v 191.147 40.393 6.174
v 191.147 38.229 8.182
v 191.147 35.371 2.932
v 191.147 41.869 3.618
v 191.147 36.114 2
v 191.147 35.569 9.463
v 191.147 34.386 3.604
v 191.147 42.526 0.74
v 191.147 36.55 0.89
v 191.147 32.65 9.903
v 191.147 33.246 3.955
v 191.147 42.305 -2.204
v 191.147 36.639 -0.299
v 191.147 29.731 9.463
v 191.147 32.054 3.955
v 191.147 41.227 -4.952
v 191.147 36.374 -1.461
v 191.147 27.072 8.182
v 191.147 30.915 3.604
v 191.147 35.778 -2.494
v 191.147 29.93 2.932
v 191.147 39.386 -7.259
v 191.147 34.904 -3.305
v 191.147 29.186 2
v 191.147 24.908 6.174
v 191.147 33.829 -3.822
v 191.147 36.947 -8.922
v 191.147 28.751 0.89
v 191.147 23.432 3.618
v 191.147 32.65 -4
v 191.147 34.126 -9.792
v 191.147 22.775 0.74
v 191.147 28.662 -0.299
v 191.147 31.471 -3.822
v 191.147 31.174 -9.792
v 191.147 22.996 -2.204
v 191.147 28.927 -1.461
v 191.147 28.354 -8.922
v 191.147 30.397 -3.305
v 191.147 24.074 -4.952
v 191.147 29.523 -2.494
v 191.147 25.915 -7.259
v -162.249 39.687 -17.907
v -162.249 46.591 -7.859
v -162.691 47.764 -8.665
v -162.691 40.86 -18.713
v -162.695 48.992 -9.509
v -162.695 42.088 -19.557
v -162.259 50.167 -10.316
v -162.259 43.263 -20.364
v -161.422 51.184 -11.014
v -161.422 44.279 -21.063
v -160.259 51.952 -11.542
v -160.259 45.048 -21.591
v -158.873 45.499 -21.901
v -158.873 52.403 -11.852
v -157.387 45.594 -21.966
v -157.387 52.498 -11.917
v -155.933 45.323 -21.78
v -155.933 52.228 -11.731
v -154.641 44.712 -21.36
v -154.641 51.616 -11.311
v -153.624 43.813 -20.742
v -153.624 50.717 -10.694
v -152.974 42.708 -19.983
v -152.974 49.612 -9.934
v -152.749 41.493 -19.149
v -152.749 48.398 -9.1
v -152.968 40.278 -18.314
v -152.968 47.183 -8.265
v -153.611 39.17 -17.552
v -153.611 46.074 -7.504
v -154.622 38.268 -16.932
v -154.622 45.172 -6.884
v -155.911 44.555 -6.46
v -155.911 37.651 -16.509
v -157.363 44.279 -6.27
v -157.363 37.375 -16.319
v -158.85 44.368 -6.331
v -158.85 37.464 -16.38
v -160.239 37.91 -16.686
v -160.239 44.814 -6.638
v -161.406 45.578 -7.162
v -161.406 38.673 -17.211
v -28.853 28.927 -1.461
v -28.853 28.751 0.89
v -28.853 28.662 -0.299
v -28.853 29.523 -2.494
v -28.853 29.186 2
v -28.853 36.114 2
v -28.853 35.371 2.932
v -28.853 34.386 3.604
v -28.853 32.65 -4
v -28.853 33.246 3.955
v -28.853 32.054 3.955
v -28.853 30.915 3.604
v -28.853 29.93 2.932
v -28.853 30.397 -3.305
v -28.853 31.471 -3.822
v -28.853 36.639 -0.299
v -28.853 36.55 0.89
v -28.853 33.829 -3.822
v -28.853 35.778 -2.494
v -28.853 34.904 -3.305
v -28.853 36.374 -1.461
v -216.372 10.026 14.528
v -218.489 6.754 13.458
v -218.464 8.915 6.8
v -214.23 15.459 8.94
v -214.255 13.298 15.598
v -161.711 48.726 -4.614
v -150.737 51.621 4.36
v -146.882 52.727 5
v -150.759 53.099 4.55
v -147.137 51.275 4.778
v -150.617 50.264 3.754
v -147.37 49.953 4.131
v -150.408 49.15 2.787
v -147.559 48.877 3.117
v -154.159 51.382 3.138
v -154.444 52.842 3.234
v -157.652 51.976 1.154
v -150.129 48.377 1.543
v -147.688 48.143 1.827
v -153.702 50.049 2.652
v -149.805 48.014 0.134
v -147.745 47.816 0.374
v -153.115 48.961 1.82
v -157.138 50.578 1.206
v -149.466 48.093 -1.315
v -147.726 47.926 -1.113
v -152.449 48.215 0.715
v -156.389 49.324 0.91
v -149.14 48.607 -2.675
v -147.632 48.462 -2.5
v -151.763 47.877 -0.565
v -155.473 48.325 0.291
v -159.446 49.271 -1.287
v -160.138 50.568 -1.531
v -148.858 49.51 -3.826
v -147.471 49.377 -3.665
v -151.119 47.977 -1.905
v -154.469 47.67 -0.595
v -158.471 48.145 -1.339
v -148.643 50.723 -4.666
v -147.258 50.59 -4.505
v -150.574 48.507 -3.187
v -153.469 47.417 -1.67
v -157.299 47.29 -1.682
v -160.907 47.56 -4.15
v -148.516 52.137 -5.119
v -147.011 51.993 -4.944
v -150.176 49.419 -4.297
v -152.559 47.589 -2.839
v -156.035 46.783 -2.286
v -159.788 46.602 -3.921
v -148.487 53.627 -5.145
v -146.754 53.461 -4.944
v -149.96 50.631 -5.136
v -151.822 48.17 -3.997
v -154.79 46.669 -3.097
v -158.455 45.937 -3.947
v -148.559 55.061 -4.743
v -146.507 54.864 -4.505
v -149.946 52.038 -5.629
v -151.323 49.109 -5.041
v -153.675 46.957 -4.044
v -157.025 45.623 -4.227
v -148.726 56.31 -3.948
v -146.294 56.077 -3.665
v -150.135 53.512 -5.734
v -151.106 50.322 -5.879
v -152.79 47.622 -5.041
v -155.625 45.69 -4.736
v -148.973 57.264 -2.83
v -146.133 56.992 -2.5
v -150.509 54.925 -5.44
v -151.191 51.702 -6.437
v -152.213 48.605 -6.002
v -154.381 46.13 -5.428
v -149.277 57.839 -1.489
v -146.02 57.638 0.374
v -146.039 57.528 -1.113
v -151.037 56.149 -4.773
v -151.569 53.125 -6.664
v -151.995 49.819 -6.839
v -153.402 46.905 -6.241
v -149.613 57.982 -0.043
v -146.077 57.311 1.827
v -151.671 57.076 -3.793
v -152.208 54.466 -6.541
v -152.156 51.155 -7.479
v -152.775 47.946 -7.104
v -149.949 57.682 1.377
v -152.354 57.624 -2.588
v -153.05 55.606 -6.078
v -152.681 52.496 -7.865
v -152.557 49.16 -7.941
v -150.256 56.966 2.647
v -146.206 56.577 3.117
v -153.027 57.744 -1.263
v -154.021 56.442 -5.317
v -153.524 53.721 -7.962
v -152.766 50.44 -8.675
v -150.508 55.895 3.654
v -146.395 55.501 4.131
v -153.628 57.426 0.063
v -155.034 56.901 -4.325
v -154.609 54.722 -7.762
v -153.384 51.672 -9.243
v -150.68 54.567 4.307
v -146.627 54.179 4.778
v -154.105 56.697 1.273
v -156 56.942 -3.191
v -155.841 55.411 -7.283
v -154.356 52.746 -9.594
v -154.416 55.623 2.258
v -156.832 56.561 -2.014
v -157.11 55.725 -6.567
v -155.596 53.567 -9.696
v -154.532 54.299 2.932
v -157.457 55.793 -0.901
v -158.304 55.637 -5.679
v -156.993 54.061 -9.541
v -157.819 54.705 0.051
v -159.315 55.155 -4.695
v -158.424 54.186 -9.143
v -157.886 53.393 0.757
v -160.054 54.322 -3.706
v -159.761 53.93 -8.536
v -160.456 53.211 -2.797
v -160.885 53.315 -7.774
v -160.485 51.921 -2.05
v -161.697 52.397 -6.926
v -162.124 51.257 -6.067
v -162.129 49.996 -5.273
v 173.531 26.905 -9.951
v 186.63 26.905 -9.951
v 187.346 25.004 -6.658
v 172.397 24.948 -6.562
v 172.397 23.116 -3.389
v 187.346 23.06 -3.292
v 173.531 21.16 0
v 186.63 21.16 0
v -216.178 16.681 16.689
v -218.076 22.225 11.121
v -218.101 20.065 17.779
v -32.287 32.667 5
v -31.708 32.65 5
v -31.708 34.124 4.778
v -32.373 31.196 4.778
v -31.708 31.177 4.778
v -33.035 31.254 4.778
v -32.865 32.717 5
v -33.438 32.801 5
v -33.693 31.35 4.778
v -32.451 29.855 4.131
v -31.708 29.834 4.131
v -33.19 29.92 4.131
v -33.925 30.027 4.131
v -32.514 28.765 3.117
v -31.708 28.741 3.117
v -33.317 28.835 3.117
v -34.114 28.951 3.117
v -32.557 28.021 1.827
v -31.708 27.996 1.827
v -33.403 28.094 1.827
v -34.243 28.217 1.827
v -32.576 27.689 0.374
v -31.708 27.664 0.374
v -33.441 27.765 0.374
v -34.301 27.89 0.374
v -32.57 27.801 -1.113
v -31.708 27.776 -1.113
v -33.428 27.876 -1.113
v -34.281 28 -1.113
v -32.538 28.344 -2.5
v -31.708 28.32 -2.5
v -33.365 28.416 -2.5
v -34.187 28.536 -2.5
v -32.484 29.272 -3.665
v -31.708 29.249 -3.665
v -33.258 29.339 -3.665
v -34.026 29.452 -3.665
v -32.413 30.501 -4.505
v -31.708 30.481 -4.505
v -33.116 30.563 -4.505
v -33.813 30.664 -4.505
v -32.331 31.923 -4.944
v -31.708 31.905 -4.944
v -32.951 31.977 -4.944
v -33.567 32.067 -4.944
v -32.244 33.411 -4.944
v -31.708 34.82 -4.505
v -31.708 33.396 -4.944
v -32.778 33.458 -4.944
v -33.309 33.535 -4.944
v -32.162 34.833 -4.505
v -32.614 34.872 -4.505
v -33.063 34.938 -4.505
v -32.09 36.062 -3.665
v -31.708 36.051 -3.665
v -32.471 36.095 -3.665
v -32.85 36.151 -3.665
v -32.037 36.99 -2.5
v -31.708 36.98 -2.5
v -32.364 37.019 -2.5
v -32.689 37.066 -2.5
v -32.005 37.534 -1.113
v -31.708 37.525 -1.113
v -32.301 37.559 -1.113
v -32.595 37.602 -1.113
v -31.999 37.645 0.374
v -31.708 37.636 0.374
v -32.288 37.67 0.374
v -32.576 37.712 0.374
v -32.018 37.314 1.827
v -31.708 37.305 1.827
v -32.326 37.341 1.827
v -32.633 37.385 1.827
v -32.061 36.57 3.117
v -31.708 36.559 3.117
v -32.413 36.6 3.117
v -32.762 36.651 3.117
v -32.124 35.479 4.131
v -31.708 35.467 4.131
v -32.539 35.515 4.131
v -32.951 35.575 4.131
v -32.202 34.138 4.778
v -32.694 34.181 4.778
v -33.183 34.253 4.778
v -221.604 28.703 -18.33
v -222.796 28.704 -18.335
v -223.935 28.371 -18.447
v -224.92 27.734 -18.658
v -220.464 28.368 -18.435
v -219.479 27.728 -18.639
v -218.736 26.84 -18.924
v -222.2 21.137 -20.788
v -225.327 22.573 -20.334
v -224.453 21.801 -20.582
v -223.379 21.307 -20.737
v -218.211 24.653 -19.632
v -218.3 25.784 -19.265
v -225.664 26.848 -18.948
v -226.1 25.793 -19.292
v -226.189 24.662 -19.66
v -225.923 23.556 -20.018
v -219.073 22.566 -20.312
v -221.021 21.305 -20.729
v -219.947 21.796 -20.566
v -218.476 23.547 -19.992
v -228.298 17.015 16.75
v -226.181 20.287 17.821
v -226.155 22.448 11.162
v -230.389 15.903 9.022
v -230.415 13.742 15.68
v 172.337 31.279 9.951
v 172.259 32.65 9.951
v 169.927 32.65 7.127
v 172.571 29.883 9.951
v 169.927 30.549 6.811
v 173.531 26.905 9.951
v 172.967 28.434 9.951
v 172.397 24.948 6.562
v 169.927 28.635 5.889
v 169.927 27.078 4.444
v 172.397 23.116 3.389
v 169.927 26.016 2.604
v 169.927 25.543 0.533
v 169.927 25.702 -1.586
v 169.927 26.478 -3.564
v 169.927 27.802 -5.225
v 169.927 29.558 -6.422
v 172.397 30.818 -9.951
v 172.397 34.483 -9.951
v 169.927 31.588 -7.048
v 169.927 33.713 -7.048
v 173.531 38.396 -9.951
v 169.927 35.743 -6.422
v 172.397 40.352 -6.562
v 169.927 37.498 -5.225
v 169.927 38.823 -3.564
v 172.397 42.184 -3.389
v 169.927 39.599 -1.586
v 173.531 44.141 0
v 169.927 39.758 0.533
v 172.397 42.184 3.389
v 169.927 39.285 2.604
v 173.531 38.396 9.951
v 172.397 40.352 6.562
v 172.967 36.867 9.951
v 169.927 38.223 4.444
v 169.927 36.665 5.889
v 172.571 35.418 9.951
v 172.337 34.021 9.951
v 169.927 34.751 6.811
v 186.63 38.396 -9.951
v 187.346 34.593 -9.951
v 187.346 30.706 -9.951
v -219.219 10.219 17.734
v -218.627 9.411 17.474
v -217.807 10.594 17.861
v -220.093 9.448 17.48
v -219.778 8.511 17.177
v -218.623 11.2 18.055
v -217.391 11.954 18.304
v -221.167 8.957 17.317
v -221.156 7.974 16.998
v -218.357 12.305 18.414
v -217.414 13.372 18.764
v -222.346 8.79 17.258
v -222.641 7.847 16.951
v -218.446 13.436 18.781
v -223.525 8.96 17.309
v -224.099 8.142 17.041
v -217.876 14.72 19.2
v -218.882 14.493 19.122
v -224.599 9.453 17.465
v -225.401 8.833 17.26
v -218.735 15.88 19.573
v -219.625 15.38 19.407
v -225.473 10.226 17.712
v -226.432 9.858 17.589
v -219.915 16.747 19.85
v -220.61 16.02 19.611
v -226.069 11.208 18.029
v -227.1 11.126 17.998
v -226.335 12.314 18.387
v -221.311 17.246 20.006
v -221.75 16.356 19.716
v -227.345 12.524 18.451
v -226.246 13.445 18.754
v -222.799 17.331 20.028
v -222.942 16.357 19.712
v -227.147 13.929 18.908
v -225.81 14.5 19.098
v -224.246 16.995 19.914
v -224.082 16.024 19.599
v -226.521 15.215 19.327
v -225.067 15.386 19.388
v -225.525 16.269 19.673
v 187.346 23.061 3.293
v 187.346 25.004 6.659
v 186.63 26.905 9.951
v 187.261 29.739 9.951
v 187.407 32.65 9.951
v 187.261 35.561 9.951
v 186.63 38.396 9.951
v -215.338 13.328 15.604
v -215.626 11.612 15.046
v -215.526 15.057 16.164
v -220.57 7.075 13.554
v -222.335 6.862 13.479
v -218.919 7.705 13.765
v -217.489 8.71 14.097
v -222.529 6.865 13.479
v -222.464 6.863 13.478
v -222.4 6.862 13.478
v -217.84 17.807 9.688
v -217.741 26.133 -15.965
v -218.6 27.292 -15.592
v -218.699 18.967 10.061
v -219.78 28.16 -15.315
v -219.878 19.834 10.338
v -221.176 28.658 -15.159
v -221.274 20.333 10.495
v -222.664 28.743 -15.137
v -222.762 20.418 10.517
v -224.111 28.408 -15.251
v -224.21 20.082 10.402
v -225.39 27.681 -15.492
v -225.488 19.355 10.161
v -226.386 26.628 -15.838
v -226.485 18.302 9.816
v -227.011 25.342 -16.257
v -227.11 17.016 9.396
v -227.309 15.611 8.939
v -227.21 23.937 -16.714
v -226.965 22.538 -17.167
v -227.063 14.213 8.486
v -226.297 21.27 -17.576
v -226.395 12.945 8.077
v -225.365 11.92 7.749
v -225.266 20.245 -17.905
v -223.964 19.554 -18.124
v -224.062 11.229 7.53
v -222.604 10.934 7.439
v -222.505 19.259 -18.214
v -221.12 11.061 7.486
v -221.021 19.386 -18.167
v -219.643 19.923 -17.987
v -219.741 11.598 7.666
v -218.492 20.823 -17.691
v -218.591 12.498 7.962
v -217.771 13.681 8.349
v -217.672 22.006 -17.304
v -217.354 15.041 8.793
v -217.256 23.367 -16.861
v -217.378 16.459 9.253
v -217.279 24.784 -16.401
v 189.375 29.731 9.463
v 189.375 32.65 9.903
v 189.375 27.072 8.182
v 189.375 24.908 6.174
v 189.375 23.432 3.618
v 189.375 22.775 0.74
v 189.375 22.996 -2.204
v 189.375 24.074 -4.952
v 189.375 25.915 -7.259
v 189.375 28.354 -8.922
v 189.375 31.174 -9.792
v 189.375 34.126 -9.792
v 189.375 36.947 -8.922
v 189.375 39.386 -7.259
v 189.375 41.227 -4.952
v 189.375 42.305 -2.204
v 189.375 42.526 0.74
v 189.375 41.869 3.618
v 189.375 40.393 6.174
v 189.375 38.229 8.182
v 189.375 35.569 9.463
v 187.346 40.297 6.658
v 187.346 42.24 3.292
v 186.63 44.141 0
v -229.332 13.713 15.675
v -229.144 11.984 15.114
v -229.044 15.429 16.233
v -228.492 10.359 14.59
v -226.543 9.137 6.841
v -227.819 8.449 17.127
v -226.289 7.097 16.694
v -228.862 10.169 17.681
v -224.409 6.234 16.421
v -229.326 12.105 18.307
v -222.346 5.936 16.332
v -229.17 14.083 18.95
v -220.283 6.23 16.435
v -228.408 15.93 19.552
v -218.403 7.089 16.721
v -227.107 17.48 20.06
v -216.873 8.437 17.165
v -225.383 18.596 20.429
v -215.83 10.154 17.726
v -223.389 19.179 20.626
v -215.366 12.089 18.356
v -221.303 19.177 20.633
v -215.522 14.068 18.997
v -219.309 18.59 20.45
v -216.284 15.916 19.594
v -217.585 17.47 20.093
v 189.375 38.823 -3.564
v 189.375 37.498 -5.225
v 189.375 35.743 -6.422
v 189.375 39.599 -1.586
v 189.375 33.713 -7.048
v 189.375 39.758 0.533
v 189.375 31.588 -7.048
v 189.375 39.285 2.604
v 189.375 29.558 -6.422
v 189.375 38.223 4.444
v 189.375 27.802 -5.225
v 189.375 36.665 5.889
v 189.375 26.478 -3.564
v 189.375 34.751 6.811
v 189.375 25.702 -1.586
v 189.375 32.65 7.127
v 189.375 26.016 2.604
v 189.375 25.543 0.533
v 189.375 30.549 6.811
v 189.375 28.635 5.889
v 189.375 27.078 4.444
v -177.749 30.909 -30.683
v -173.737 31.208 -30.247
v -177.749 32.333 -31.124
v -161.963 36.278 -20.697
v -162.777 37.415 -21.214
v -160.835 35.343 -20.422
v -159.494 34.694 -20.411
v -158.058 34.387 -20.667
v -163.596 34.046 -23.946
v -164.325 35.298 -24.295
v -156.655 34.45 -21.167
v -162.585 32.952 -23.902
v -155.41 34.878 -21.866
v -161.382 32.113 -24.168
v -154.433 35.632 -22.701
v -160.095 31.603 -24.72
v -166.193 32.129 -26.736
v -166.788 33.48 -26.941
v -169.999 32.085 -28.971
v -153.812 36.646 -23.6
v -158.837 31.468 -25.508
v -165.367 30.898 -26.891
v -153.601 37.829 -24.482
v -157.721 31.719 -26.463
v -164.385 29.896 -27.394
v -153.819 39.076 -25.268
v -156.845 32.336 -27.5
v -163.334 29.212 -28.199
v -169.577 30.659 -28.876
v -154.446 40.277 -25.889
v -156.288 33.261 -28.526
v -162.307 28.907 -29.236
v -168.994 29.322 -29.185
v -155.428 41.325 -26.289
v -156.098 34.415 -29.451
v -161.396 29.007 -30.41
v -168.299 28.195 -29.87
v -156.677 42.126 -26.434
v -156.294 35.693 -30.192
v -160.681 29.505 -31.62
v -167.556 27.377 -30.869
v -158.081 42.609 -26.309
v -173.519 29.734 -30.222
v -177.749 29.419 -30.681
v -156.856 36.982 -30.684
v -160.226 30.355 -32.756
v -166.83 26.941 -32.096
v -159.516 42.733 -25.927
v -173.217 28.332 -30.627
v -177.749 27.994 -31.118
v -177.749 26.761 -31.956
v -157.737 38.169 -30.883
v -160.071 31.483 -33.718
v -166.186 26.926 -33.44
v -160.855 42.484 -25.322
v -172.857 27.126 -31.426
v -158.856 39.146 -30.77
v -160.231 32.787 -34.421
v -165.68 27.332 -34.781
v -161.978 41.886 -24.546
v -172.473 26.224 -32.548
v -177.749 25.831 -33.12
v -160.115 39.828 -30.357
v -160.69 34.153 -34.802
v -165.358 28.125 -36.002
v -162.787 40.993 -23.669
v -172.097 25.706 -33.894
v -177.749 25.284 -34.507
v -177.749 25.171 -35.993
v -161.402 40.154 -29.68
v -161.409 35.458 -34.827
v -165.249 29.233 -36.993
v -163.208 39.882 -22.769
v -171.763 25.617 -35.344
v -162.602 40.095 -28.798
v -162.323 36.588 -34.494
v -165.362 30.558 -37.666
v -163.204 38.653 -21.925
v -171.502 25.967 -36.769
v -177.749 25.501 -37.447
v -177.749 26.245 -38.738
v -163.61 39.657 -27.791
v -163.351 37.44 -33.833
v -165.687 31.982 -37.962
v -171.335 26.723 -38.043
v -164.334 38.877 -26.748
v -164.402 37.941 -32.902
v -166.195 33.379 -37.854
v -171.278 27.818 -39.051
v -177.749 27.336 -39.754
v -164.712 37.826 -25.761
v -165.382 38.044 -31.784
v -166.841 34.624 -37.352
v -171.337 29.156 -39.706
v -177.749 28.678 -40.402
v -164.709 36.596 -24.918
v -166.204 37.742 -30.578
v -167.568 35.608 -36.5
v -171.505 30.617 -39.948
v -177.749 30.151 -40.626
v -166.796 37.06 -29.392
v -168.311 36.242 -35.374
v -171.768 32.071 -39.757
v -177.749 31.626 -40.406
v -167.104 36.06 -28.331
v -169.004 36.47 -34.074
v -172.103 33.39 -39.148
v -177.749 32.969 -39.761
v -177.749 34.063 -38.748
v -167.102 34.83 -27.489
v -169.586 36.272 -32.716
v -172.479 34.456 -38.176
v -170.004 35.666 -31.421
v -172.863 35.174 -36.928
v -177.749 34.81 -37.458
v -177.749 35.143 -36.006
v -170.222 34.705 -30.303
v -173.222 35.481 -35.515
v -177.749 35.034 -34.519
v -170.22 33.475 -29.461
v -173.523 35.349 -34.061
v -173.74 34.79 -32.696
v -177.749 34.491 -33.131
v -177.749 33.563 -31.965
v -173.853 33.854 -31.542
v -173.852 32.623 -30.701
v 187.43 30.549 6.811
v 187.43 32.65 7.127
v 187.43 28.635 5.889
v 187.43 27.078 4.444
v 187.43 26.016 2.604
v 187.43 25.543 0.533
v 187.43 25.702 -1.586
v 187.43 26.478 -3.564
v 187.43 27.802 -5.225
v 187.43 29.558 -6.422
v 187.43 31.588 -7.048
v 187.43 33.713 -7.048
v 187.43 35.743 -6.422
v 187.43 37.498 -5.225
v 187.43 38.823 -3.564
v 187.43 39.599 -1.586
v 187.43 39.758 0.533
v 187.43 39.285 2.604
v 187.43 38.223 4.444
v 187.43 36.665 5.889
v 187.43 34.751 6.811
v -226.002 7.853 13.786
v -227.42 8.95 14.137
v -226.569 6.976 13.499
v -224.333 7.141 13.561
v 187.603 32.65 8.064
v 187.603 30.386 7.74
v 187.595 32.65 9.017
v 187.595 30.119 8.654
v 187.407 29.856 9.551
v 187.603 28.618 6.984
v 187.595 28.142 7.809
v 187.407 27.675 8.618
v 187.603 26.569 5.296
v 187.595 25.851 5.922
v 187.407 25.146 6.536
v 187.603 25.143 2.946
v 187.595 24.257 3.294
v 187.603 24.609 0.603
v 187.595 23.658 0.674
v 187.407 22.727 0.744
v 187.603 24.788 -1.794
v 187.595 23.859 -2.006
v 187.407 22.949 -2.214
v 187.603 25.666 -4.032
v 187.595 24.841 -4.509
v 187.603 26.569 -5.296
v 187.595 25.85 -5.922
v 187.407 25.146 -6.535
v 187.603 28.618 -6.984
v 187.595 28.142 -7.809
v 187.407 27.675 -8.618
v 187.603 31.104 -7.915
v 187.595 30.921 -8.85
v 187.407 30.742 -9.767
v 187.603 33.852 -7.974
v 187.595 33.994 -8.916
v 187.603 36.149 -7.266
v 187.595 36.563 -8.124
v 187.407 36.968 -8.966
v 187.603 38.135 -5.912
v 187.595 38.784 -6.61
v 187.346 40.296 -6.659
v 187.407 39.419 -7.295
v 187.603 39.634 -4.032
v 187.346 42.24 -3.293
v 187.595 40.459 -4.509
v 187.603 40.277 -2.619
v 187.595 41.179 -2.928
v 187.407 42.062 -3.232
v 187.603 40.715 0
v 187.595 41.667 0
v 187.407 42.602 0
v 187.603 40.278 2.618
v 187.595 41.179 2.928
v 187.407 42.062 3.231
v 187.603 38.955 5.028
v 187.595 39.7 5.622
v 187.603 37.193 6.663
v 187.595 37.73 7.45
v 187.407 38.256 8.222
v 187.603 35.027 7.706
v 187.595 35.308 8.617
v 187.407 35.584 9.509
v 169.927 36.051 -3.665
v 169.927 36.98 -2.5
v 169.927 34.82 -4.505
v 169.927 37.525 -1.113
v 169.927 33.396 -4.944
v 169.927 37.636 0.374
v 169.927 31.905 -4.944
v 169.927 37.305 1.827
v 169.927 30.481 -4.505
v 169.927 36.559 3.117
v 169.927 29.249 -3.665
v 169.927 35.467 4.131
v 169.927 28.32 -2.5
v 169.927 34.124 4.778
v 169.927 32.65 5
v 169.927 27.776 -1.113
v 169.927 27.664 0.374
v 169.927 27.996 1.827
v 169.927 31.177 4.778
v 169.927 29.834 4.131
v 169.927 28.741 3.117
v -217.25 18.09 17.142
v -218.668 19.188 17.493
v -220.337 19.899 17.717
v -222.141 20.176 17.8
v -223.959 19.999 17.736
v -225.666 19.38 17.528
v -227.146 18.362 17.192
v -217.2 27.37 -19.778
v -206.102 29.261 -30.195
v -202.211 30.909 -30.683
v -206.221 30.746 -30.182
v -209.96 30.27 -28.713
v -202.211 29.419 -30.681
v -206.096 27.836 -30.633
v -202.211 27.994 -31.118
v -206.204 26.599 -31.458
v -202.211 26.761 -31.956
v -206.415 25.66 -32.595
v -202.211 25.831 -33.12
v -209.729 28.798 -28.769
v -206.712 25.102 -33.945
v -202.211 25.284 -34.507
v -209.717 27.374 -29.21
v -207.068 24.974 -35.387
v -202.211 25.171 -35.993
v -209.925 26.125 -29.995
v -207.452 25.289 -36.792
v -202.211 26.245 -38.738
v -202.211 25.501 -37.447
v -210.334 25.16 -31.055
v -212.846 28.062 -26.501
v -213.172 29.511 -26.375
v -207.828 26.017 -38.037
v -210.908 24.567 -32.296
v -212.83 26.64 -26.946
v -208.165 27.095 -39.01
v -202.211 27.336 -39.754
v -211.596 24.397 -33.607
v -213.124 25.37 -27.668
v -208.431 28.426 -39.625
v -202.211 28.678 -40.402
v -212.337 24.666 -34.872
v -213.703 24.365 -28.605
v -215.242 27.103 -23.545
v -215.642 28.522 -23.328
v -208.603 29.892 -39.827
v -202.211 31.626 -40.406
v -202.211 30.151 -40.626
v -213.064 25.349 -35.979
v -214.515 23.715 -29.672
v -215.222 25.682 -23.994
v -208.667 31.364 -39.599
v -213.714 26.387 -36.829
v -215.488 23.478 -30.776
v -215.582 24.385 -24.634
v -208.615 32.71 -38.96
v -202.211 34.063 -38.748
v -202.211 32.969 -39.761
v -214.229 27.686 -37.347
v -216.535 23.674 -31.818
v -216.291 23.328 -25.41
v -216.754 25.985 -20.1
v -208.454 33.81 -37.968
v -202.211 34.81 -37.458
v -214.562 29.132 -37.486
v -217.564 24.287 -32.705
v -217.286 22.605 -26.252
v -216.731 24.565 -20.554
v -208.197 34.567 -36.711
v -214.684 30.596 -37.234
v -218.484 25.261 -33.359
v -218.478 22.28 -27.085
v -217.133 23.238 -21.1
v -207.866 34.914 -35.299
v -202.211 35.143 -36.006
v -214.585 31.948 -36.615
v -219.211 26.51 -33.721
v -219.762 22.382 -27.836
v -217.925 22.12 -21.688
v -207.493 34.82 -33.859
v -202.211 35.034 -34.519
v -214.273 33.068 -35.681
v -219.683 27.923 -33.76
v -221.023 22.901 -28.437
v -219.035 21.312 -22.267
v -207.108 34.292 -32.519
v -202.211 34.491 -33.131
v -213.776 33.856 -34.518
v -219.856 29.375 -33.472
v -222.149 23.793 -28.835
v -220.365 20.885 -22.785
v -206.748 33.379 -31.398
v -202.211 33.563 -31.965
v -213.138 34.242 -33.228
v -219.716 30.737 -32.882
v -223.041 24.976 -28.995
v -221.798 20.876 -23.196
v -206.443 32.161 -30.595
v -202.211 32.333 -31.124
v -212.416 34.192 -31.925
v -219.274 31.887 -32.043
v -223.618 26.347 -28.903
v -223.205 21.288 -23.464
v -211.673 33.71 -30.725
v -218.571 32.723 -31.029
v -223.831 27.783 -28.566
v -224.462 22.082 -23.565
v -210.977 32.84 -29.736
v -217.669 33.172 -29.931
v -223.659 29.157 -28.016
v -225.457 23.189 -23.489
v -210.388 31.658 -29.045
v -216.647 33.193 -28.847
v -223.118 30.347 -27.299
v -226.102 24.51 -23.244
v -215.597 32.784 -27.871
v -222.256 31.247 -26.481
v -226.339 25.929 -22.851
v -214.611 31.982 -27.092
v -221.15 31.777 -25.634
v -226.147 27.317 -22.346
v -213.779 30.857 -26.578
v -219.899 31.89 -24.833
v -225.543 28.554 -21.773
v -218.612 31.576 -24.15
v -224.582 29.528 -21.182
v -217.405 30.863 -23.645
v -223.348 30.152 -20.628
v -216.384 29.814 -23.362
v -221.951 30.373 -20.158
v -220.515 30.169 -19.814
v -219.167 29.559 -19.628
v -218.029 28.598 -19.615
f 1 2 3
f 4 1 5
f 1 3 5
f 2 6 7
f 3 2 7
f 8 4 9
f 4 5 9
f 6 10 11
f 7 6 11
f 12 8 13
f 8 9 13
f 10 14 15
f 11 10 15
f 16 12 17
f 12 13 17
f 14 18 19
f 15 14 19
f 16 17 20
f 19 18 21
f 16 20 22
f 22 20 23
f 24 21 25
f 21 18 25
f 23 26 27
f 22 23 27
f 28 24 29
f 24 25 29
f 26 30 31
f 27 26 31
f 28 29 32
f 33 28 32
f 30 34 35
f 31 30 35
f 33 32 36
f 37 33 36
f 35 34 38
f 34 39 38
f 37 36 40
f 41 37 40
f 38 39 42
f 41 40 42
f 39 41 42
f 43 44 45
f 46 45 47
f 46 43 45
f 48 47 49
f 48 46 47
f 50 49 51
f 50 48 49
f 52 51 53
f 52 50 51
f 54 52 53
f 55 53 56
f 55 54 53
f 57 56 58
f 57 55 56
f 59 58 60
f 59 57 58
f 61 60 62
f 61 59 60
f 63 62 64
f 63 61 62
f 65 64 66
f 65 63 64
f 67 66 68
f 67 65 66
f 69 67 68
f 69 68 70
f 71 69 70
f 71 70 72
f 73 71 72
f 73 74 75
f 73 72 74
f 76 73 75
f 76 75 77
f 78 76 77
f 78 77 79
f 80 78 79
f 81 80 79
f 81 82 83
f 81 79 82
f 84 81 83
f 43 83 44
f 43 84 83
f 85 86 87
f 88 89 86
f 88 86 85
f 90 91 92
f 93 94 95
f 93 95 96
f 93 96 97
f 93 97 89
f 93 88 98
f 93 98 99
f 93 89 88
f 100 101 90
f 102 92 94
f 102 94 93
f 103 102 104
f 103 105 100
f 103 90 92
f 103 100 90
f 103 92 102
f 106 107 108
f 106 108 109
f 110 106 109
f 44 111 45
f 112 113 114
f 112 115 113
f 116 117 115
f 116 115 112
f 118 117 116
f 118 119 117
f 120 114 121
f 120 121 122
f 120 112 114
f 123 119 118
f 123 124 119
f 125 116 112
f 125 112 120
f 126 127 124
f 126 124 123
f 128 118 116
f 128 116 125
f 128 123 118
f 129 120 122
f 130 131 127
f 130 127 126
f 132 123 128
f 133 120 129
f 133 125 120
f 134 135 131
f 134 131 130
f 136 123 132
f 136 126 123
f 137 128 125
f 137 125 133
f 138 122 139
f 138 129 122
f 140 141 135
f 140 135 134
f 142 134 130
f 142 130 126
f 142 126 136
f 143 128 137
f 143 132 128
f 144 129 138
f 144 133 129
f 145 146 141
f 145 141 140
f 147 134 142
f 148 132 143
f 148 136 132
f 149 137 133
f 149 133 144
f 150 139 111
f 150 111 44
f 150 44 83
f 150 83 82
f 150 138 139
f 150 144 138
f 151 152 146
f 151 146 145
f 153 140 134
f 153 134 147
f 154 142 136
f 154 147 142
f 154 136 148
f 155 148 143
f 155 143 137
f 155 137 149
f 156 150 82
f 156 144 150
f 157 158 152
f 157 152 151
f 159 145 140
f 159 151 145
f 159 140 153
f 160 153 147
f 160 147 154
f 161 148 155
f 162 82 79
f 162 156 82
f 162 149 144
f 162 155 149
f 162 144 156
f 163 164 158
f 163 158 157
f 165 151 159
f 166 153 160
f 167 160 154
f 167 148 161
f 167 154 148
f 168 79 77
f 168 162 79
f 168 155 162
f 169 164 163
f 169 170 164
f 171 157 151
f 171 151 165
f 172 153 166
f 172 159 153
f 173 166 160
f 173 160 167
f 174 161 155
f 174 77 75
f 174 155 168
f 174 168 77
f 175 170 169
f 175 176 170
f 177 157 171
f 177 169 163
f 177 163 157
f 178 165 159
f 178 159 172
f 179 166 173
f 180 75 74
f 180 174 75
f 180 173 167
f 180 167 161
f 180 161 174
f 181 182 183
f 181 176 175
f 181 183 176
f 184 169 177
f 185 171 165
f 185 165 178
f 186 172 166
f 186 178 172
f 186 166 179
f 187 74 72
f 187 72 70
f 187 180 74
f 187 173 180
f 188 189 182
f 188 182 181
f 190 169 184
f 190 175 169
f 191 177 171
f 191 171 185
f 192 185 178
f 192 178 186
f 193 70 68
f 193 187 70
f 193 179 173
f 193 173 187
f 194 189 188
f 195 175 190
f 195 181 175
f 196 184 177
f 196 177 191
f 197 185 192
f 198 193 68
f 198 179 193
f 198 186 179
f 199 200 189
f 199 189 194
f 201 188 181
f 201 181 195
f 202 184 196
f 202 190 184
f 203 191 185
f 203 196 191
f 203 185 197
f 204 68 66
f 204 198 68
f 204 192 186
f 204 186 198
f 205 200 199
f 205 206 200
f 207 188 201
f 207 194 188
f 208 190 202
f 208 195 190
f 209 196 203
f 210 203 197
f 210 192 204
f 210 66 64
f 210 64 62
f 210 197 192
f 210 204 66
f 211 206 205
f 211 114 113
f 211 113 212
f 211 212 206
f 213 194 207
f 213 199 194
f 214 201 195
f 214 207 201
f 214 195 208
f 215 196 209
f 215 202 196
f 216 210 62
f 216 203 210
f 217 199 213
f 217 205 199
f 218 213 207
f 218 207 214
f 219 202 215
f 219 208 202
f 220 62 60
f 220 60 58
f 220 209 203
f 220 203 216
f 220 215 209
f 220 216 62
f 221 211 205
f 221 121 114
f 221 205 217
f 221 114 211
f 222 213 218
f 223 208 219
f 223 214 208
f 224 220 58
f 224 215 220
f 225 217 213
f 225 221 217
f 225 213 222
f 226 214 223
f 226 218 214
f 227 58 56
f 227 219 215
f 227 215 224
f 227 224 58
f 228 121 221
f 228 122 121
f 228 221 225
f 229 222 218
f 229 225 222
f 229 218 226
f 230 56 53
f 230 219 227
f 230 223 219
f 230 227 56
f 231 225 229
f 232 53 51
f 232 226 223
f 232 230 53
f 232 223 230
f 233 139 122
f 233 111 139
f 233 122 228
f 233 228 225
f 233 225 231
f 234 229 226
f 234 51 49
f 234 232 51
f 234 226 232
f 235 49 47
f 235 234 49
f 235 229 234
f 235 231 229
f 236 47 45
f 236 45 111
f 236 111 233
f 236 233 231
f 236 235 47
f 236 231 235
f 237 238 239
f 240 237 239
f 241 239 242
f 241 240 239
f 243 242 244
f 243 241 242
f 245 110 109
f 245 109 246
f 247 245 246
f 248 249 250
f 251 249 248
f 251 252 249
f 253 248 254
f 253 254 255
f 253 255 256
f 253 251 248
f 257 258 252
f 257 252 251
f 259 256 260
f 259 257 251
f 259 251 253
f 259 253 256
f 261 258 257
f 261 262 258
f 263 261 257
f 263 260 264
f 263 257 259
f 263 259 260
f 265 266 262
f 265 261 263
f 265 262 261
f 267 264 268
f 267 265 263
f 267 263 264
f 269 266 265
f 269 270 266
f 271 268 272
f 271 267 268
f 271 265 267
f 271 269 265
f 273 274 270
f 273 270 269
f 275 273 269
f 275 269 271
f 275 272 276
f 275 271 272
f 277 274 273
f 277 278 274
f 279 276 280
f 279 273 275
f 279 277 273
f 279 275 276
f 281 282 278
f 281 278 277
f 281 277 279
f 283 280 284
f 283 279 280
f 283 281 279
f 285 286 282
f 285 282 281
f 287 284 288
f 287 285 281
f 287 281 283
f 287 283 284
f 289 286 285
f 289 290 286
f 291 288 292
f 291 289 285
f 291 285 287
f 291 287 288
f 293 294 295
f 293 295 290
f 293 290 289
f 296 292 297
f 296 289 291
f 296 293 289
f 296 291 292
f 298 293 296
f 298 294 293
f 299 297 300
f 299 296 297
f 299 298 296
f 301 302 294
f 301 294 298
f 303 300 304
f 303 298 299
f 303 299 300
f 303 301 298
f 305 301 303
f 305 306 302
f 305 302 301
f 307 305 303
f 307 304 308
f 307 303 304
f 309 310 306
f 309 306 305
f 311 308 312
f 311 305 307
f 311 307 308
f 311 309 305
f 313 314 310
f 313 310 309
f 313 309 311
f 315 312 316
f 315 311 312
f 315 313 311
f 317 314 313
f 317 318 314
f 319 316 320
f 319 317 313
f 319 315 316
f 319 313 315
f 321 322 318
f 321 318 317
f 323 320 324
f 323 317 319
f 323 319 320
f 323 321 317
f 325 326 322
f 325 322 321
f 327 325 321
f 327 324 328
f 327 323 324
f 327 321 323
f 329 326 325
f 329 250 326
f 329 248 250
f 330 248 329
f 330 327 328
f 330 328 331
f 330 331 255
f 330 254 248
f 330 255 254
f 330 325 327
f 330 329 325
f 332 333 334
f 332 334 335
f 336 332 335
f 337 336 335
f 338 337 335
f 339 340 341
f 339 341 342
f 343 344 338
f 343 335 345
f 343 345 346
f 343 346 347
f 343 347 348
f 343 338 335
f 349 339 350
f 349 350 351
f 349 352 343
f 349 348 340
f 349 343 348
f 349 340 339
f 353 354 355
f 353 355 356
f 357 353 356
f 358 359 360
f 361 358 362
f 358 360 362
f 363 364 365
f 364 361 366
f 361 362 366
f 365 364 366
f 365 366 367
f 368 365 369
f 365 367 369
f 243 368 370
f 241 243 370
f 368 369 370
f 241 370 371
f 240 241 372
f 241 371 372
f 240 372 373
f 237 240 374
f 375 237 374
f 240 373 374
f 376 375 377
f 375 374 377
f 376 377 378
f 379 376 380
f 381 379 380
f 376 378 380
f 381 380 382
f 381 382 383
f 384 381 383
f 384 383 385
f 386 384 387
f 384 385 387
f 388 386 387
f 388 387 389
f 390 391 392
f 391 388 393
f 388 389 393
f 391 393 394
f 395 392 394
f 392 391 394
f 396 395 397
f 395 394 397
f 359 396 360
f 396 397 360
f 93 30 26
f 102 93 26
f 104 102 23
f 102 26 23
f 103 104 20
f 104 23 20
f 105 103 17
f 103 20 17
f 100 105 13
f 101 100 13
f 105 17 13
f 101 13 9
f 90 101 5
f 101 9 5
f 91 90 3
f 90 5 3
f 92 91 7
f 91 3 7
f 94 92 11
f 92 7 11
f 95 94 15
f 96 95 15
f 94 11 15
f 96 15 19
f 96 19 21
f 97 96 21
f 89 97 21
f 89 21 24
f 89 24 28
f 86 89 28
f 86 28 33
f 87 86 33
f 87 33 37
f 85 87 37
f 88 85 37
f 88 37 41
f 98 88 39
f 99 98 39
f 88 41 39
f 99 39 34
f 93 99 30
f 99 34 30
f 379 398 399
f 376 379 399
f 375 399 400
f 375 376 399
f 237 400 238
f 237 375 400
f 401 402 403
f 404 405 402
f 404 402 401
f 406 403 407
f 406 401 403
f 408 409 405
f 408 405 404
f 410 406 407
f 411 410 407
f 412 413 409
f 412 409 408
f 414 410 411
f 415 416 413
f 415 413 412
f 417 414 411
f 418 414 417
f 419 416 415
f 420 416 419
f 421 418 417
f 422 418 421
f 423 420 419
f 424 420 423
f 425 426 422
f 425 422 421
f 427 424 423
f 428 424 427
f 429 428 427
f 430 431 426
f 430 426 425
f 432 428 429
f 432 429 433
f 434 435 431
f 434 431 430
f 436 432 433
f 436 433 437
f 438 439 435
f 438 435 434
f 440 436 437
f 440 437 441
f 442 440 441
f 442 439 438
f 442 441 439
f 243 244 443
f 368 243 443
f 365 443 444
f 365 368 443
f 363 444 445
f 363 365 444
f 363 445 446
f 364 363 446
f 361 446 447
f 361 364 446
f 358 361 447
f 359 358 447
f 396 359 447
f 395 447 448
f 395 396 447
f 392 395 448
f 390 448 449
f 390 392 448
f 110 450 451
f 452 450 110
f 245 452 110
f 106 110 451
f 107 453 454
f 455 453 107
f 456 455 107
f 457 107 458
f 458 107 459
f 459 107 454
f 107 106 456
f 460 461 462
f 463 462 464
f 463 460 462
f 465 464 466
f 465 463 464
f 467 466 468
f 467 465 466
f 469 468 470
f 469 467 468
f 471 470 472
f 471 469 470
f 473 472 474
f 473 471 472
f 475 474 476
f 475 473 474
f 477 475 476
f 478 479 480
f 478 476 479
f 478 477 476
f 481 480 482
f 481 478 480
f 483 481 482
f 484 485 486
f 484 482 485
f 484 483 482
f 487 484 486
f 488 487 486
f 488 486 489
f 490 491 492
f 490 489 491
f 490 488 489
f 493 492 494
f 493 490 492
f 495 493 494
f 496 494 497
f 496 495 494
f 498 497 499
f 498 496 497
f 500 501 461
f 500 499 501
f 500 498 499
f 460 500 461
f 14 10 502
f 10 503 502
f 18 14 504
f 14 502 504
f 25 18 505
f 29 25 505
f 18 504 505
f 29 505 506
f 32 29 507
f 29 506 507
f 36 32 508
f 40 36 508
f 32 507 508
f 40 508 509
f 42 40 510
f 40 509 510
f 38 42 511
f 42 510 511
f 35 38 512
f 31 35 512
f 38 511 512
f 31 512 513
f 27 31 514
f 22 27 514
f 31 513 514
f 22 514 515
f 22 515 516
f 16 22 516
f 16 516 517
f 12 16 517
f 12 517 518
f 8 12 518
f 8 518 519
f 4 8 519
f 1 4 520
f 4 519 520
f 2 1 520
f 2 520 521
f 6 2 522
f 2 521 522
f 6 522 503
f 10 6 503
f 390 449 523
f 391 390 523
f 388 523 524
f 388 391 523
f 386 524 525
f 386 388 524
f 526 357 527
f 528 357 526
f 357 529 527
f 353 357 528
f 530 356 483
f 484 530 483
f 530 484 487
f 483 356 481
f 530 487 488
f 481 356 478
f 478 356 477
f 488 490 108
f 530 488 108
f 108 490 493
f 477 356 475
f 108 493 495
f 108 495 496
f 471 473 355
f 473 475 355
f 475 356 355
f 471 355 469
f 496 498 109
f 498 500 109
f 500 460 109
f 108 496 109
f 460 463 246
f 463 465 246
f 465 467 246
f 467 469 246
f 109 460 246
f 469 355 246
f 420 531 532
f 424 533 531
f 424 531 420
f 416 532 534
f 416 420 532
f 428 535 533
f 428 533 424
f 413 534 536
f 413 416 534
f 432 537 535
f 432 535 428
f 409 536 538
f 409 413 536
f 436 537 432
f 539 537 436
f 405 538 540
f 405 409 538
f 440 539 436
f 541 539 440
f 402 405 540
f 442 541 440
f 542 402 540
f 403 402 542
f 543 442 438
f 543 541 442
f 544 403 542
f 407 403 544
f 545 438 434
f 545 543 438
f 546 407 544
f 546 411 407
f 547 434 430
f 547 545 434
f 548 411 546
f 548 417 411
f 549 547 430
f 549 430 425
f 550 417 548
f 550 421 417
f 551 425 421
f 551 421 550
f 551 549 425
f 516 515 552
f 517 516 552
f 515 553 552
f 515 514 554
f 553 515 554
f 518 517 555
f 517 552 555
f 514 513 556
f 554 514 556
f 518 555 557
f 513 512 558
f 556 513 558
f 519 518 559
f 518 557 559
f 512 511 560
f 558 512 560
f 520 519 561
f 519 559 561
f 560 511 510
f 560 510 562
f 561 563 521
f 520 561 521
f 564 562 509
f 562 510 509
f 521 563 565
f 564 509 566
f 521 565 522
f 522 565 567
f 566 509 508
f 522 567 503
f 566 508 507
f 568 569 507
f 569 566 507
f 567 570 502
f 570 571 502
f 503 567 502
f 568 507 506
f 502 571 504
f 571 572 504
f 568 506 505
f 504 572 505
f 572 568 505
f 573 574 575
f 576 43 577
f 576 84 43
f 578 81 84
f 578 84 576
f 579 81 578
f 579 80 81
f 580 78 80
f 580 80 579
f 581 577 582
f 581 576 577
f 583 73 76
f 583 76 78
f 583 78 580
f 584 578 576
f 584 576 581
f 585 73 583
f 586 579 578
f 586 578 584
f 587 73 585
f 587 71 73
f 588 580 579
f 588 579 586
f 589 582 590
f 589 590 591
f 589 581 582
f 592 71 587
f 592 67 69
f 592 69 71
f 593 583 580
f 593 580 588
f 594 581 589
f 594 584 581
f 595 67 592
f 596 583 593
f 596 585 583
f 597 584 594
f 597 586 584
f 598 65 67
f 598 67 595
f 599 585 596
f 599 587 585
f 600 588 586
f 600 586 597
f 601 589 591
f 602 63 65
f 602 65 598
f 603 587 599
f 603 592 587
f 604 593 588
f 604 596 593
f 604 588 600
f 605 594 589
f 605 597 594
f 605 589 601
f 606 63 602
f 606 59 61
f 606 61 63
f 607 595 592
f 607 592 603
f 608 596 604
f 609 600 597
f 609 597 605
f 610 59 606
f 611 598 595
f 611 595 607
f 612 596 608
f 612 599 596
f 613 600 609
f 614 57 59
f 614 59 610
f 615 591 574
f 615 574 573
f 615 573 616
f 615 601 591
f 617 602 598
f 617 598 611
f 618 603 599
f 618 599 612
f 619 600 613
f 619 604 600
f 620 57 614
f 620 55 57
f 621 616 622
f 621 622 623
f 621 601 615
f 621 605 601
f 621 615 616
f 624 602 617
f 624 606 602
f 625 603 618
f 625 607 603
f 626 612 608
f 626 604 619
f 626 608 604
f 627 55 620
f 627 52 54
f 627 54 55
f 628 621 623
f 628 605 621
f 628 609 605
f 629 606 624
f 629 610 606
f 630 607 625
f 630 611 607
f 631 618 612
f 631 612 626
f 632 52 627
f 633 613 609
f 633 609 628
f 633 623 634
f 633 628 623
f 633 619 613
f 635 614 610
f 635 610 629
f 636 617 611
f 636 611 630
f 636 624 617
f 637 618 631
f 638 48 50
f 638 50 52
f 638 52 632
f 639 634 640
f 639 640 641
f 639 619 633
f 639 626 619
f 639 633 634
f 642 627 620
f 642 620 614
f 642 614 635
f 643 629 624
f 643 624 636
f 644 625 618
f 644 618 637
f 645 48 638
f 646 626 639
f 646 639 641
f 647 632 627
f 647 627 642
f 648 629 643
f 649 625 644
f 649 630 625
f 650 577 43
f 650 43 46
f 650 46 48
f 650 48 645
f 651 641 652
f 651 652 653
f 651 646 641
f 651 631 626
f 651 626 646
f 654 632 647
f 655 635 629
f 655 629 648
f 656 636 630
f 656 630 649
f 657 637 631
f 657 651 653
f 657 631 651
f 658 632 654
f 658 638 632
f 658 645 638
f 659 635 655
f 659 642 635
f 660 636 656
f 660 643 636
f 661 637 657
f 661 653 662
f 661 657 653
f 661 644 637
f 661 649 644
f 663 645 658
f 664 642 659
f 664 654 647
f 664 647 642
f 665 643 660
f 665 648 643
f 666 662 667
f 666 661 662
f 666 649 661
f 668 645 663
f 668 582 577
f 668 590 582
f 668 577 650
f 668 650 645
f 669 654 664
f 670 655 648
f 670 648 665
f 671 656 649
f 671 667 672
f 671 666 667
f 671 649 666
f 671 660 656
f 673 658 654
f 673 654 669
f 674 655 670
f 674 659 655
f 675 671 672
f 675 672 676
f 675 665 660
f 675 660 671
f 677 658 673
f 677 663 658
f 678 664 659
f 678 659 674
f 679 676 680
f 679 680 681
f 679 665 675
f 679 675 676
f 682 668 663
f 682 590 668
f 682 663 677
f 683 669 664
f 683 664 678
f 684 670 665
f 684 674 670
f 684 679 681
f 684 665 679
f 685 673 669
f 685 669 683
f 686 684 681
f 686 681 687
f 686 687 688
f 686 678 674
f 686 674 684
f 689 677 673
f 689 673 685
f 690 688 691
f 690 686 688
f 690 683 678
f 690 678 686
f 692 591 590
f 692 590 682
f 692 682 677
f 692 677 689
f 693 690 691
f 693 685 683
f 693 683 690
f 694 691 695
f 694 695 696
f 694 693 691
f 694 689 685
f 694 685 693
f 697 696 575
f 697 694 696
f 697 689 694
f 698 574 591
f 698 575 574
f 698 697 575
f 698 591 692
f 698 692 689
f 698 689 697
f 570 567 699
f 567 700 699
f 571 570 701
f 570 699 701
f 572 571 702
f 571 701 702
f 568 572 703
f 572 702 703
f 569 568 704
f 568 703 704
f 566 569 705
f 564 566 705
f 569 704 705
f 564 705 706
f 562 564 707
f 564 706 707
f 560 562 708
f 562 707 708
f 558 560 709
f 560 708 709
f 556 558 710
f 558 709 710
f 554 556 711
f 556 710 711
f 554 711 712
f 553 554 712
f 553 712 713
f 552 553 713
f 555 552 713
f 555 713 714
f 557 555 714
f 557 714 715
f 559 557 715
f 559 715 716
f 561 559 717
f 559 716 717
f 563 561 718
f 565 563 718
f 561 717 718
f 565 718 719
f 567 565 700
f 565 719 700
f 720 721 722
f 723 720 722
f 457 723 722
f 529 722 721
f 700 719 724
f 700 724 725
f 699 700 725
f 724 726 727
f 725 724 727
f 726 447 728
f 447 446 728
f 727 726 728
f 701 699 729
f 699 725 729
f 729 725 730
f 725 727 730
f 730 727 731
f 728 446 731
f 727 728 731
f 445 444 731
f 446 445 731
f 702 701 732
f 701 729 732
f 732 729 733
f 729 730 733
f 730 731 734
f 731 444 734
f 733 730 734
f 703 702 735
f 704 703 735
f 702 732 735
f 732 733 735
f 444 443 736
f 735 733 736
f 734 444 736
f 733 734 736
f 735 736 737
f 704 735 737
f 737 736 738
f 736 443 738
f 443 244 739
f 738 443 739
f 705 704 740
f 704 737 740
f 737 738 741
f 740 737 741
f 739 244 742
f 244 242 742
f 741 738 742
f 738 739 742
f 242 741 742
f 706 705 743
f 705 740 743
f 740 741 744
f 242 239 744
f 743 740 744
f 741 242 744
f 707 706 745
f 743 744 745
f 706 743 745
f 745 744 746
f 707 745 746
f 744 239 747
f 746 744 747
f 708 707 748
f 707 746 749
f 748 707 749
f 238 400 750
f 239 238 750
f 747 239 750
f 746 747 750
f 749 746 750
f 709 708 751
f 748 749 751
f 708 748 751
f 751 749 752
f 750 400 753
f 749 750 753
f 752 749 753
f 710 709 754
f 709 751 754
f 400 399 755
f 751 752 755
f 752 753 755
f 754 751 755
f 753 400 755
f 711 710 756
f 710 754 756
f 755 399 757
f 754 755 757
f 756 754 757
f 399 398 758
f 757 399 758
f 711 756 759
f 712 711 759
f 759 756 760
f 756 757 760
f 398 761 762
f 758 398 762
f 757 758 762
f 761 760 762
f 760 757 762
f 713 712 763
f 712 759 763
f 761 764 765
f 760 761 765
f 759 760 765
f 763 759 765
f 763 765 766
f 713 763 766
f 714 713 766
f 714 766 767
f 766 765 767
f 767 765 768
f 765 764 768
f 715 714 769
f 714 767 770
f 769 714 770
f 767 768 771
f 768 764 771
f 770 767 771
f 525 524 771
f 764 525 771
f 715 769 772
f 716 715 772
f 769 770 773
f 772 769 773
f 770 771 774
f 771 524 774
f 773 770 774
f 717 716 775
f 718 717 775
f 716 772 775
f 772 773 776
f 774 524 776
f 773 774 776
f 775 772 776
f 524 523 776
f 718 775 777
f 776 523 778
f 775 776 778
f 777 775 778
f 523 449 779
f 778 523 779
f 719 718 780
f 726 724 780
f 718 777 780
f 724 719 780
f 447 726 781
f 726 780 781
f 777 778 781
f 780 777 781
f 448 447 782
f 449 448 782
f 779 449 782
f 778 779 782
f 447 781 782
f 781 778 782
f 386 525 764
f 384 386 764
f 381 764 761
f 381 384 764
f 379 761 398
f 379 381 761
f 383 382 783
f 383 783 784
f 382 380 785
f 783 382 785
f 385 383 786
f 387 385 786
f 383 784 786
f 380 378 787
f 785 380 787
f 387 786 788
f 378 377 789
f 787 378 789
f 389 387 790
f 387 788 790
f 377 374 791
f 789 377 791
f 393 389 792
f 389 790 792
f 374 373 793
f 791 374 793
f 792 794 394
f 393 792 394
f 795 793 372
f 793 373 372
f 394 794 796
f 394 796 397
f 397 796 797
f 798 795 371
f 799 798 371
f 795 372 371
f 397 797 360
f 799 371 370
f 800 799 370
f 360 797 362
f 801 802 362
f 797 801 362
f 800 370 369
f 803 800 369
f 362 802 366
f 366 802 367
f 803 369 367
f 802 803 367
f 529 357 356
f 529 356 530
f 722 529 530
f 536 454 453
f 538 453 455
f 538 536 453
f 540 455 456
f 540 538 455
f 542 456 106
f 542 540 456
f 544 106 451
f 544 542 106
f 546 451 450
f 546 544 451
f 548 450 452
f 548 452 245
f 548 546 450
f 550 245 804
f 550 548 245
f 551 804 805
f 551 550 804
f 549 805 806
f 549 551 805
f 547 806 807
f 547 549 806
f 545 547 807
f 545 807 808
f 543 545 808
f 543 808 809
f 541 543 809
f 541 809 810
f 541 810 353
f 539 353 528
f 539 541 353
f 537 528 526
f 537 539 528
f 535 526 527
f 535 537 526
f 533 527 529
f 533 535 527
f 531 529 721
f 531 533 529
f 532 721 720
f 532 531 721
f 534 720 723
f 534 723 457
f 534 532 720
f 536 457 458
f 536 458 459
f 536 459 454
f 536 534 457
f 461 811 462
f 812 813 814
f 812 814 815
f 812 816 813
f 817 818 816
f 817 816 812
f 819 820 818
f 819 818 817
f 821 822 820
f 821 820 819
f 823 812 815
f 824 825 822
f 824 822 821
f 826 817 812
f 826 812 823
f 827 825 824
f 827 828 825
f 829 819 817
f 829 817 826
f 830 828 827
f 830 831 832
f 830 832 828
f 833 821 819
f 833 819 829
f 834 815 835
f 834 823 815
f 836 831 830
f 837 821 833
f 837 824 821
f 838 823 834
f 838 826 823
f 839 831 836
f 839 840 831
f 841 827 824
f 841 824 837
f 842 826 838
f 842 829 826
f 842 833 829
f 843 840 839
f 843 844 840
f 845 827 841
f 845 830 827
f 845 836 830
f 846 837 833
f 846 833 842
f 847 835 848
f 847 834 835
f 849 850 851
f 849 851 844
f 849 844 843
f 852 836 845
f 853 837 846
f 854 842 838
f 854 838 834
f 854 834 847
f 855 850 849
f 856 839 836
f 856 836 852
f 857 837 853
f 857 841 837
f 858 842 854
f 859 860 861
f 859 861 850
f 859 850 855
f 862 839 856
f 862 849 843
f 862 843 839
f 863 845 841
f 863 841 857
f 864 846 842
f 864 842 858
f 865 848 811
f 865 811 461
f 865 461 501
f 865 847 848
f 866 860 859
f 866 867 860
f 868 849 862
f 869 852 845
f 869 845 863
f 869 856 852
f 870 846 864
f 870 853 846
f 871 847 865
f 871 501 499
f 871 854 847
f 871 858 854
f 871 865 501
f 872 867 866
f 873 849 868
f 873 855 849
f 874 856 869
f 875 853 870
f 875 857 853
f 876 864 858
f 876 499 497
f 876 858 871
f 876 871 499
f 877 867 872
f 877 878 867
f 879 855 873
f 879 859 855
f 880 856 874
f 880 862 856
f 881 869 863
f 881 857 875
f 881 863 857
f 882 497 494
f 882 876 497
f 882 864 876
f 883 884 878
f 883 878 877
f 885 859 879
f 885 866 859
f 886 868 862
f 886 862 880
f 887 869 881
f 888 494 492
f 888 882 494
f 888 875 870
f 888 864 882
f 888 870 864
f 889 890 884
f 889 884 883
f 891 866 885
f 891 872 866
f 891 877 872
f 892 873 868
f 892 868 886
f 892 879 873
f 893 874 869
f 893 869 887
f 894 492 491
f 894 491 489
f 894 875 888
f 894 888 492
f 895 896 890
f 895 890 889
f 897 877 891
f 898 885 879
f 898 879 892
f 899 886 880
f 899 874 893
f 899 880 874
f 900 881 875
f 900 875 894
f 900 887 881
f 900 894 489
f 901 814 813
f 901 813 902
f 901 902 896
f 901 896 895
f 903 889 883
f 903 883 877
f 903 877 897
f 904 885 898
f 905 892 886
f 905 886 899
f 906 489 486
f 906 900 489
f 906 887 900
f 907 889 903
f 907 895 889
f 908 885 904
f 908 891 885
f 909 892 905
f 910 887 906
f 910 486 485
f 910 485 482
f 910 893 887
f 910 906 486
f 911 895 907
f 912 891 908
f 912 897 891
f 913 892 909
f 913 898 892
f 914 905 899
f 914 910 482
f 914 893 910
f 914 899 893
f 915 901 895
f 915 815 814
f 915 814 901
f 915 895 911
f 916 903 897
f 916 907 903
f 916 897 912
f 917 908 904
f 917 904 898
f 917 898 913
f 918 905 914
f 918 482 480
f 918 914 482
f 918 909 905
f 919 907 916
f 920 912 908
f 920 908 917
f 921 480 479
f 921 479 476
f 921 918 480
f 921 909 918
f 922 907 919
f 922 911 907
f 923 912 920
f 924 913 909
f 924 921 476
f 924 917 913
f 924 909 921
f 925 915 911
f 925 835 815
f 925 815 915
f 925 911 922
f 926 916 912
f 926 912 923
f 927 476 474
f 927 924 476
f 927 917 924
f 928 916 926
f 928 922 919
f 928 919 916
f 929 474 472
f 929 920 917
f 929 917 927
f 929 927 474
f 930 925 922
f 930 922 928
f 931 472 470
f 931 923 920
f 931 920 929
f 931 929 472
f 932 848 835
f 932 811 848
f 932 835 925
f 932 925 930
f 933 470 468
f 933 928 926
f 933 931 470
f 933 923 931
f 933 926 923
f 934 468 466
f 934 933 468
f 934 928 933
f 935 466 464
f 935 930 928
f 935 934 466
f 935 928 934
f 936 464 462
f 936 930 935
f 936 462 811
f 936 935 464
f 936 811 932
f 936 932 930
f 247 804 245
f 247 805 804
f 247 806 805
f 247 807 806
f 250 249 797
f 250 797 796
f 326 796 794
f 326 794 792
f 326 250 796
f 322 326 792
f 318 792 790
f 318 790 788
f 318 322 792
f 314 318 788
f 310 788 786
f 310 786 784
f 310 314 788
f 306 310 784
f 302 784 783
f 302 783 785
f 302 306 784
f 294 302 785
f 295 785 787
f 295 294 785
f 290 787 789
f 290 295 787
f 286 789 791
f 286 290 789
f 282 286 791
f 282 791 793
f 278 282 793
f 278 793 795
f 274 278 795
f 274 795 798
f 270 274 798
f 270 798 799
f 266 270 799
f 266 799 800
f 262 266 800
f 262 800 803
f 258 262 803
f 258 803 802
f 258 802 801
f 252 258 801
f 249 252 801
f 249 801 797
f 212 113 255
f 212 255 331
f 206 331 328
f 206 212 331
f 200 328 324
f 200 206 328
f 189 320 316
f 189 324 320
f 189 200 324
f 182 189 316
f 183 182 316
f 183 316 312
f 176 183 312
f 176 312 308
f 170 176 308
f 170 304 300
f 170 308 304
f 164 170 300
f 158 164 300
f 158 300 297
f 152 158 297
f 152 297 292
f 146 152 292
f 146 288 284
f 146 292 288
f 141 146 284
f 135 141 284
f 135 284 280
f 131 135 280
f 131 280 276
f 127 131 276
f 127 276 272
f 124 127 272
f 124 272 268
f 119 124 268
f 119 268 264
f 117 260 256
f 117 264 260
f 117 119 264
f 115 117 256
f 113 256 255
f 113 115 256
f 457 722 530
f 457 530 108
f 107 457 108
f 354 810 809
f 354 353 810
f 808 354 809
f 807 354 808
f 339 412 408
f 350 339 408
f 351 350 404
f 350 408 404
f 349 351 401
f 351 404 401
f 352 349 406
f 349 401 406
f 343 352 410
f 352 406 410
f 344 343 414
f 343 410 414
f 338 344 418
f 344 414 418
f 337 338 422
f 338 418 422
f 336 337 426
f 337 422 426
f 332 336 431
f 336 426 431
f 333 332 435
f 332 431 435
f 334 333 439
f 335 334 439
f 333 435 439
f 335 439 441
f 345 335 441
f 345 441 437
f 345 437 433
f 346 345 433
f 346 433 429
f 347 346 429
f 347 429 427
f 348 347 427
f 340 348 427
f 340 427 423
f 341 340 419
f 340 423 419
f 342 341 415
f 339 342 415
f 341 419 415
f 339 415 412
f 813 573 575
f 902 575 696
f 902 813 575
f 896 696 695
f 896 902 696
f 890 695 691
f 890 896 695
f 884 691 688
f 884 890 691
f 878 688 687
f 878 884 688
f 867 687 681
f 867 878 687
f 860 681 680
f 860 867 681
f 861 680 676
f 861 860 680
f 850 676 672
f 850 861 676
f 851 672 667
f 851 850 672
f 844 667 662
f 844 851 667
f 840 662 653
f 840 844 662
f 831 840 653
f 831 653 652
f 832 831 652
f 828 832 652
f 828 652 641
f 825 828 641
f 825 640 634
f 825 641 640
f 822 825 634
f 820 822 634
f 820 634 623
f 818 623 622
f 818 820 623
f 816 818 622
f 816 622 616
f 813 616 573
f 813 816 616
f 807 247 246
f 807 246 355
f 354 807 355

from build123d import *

# Parameters (mm, degrees)
SKETCH2_R             = 14.49115295
CUT_EXTRUDE1_DEPTH    = 51.306406252
SKETCH3_R             = 5
EXTRUDE1_DEPTH        = 10
SKETCH5_R             = 9.901602584
SKETCH5_R_2           = 7
CUT_EXTRUDE2_DEPTH    = 3
IZIM2_R               = 4
KES_EKSTR_ZYON1_DEPTH = 220
IZIM3_R               = 4
KES_EKSTR_ZYON2_DEPTH = 40


with BuildPart() as part:
    # Sketch1 → Revolve1 (revolve)
    with BuildSketch(Plane.XY, mode=Mode.PRIVATE) as revolve1_sk:
        with BuildLine():
            Line((180.080433705, 44.141017842), (173.530538009, 44.141017842))
            ThreePointArc((173.530538009, 44.141017842), (172.538729892, 41.151971535), (173.530538009, 38.162925228))
            Line((173.530538009, 38.162925228), (180.080433705, 38.162925228))
            Line((180.080433705, 38.162925228), (180.080433705, 44.141017842))
        make_face()
        with BuildLine():
            Line((186.630329401, 44.141017842), (180.080433705, 44.141017842))
            Line((180.080433705, 44.141017842), (180.080433705, 38.162925228))
            Line((180.080433705, 38.162925228), (186.630329401, 38.162925228))
            ThreePointArc((186.630329401, 38.162925228), (187.103282451, 38.934012994), (187.429565668, 39.777695512))
            ThreePointArc((187.429565668, 39.777695512), (187.540311425, 42.052840793), (186.630329401, 44.141017842))
        make_face()
        with BuildLine():
            Line((180.080433705, 38.162925228), (180.080433705, 32.650327481))
            Line((180.080433705, 32.650327481), (187.735613173, 32.650327481))
            ThreePointArc((187.735613173, 32.650327481), (187.427007794, 35.455556025), (186.630329401, 38.162925228))
            Line((186.630329401, 38.162925228), (180.080433705, 38.162925228))
        make_face()
        with BuildLine():
            ThreePointArc((173.530538009, 38.162925228), (172.733859616, 35.455556025), (172.425254237, 32.650327481))
            Line((172.425254237, 32.650327481), (180.080433705, 32.650327481))
            Line((180.080433705, 32.650327481), (180.080433705, 38.162925228))
            Line((180.080433705, 38.162925228), (173.530538009, 38.162925228))
        make_face()
        with BuildLine():
            Line((173.530538009, 44.141017842), (169.927279386, 39.777695512))
            Line((169.927279386, 39.777695512), (169.927279386, 32.650327481))
            Line((169.927279386, 32.650327481), (172.425254237, 32.650327481))
            ThreePointArc((172.425254237, 32.650327481), (172.733859616, 35.455556025), (173.530538009, 38.162925228))
            ThreePointArc((173.530538009, 38.162925228), (172.538729892, 41.151971535), (173.530538009, 44.141017842))
        make_face()
        with BuildLine():
            ThreePointArc((186.630329401, 38.162925228), (187.427007794, 35.455556025), (187.735613173, 32.650327481))
            Line((187.735613173, 32.650327481), (189.375361044, 32.650327481))
            Line((189.375361044, 32.650327481), (189.375361044, 39.777695512))
            Line((189.375361044, 39.777695512), (187.429565668, 39.777695512))
            ThreePointArc((187.429565668, 39.777695512), (187.103282451, 38.934012994), (186.630329401, 38.162925228))
        make_face()
        Polygon((189.375361044, 39.777695512), (189.375361044, 32.650327481), (191.146824361, 32.650327481), (191.146824361, 42.553378699), (189.375361044, 42.553378699), align=None)
    revolve(revolve1_sk.sketch.rotate(Axis((-32.579678715, 32.650327481, 0), (1, 0, 0)), 90), axis=Axis((-32.579678715, 32.650327481, 0), (1, 0, 0)))

    # Sketch2 → Cut-Extrude1 (cut, through all)
    with BuildSketch(Plane.ZY.offset(-169.927279386)):
        with Locations((0, 32.650327481)):
            Circle(SKETCH2_R)
        Polygon((0, 44.141017842), (-9.95122976, 38.395672661), (-9.95122976, 26.9049823), (0, 21.15963712), (9.95122976, 26.9049823), (9.95122976, 38.395672661), align=None, mode=Mode.SUBTRACT)
    extrude(amount=-CUT_EXTRUDE1_DEPTH, mode=Mode.SUBTRACT)

    # Sweep3: sweep along a curve in space
    with BuildLine() as sweep3_path:
        Line((-222.210887695, 24.006507797, -16.672116117), (-222.346014244, 12.594218126, 18.492799117))
        ThreePointArc((-202.211021283, 30.157684617, -35.625859644), (-216.32728873, 28.357408148, -30.07863194), (-222.210887695, 24.006507797, -16.672116117))
        Line((-177.748857503, 30.157684617, -35.625859644), (-202.211021283, 30.157684617, -35.625859644))
        ThreePointArc((-157.748857503, 41.483617341, -19.141829556), (-163.606721879, 33.474973508, -30.797799013), (-177.748857503, 30.157684617, -35.625859644))
        Line((-157.748857503, 48.387877179, -9.093206659), (-157.748857503, 41.483617341, -19.141829556))
        ThreePointArc((-146.882458064, 52.727054495, 0), (-154.498514664, 52.19594197, -2.719947791), (-157.748857503, 48.387877179, -9.093206659))
        Line((-33.438092351, 32.801103659, 0), (-146.882458064, 52.727054495, 0))
        ThreePointArc((-31.708124112, 32.650327481, 0), (-32.576387258, 32.688092836, 0), (-33.438092351, 32.801103659, 0))
        Line((-31.708124112, 32.650327481, 0), (169.927279386, 32.650327481, 0))
    # Sketch3 → Sweep3 (sweep)
    with BuildSketch(Plane.ZY.offset(-169.927279386)):
        with Locations((0, 32.650327481)):
            Circle(SKETCH3_R)
    sweep(path=sweep3_path.line)

    # Sketch4 → Extrude1 (add)
    with BuildSketch(Plane(origin=(-0.053050316, -4.480433927, 13.805650207), x_dir=(0.9999933205859823, -0.0011282410835596105, 0.0034764716996236633), z_dir=(-0.003654966952096285, -0.30868502023615024, 0.9511572948247765))):
        Polygon((-226.140355235, 24.796964016), (-230.374247953, 17.911654597), (-226.528341443, 10.802341238), (-218.448542214, 10.578337297), (-214.214649497, 17.463646715), (-218.060556007, 24.572960075), align=None)
    extrude(amount=-EXTRUDE1_DEPTH)

    # Sketch5 → Cut-Extrude2 (cut)
    with BuildSketch(Plane(origin=(-0.053050316, -4.480433927, 13.805650207), x_dir=(0.9999933205859823, -0.0011282410835596105, 0.0034764716996236633), z_dir=(-0.003654966952096285, -0.30868502023615024, 0.9511572948247765))):
        with Locations((-222.294448725, 17.687650656)):
            Circle(SKETCH5_R)
        with Locations(Location((-222.294448725, 17.687650656, 0), (0, 0, 270))):
            Circle(SKETCH5_R_2, mode=Mode.SUBTRACT)
    extrude(amount=-CUT_EXTRUDE2_DEPTH, mode=Mode.SUBTRACT)

    # Çizim2 → Kes-Ekstrüzyon1 (cut)
    with BuildSketch(Plane(origin=(191.146824361, 0, 0), x_dir=(0, 0, -1), z_dir=(1, 0, 0))):
        with Locations((0, 32.650327481)):
            Circle(IZIM2_R)
    extrude(amount=-KES_EKSTR_ZYON1_DEPTH, mode=Mode.SUBTRACT)

    # Çizim3 → Kes-Ekstrüzyon2 (cut)
    with BuildSketch(Plane(origin=(-0.053050316, -4.480433927, 13.805650207), x_dir=(0.9999933205859823, -0.0011282410835595914, 0.003476471699623597), z_dir=(-0.003654966952096216, -0.3086850202361507, 0.9511572948247764))):
        with Locations(Location((-222.294448725, 17.687650656, 0), (0, 0, 270))):
            Circle(IZIM3_R)
    extrude(amount=-KES_EKSTR_ZYON2_DEPTH, mode=Mode.SUBTRACT)


solid = part.part
